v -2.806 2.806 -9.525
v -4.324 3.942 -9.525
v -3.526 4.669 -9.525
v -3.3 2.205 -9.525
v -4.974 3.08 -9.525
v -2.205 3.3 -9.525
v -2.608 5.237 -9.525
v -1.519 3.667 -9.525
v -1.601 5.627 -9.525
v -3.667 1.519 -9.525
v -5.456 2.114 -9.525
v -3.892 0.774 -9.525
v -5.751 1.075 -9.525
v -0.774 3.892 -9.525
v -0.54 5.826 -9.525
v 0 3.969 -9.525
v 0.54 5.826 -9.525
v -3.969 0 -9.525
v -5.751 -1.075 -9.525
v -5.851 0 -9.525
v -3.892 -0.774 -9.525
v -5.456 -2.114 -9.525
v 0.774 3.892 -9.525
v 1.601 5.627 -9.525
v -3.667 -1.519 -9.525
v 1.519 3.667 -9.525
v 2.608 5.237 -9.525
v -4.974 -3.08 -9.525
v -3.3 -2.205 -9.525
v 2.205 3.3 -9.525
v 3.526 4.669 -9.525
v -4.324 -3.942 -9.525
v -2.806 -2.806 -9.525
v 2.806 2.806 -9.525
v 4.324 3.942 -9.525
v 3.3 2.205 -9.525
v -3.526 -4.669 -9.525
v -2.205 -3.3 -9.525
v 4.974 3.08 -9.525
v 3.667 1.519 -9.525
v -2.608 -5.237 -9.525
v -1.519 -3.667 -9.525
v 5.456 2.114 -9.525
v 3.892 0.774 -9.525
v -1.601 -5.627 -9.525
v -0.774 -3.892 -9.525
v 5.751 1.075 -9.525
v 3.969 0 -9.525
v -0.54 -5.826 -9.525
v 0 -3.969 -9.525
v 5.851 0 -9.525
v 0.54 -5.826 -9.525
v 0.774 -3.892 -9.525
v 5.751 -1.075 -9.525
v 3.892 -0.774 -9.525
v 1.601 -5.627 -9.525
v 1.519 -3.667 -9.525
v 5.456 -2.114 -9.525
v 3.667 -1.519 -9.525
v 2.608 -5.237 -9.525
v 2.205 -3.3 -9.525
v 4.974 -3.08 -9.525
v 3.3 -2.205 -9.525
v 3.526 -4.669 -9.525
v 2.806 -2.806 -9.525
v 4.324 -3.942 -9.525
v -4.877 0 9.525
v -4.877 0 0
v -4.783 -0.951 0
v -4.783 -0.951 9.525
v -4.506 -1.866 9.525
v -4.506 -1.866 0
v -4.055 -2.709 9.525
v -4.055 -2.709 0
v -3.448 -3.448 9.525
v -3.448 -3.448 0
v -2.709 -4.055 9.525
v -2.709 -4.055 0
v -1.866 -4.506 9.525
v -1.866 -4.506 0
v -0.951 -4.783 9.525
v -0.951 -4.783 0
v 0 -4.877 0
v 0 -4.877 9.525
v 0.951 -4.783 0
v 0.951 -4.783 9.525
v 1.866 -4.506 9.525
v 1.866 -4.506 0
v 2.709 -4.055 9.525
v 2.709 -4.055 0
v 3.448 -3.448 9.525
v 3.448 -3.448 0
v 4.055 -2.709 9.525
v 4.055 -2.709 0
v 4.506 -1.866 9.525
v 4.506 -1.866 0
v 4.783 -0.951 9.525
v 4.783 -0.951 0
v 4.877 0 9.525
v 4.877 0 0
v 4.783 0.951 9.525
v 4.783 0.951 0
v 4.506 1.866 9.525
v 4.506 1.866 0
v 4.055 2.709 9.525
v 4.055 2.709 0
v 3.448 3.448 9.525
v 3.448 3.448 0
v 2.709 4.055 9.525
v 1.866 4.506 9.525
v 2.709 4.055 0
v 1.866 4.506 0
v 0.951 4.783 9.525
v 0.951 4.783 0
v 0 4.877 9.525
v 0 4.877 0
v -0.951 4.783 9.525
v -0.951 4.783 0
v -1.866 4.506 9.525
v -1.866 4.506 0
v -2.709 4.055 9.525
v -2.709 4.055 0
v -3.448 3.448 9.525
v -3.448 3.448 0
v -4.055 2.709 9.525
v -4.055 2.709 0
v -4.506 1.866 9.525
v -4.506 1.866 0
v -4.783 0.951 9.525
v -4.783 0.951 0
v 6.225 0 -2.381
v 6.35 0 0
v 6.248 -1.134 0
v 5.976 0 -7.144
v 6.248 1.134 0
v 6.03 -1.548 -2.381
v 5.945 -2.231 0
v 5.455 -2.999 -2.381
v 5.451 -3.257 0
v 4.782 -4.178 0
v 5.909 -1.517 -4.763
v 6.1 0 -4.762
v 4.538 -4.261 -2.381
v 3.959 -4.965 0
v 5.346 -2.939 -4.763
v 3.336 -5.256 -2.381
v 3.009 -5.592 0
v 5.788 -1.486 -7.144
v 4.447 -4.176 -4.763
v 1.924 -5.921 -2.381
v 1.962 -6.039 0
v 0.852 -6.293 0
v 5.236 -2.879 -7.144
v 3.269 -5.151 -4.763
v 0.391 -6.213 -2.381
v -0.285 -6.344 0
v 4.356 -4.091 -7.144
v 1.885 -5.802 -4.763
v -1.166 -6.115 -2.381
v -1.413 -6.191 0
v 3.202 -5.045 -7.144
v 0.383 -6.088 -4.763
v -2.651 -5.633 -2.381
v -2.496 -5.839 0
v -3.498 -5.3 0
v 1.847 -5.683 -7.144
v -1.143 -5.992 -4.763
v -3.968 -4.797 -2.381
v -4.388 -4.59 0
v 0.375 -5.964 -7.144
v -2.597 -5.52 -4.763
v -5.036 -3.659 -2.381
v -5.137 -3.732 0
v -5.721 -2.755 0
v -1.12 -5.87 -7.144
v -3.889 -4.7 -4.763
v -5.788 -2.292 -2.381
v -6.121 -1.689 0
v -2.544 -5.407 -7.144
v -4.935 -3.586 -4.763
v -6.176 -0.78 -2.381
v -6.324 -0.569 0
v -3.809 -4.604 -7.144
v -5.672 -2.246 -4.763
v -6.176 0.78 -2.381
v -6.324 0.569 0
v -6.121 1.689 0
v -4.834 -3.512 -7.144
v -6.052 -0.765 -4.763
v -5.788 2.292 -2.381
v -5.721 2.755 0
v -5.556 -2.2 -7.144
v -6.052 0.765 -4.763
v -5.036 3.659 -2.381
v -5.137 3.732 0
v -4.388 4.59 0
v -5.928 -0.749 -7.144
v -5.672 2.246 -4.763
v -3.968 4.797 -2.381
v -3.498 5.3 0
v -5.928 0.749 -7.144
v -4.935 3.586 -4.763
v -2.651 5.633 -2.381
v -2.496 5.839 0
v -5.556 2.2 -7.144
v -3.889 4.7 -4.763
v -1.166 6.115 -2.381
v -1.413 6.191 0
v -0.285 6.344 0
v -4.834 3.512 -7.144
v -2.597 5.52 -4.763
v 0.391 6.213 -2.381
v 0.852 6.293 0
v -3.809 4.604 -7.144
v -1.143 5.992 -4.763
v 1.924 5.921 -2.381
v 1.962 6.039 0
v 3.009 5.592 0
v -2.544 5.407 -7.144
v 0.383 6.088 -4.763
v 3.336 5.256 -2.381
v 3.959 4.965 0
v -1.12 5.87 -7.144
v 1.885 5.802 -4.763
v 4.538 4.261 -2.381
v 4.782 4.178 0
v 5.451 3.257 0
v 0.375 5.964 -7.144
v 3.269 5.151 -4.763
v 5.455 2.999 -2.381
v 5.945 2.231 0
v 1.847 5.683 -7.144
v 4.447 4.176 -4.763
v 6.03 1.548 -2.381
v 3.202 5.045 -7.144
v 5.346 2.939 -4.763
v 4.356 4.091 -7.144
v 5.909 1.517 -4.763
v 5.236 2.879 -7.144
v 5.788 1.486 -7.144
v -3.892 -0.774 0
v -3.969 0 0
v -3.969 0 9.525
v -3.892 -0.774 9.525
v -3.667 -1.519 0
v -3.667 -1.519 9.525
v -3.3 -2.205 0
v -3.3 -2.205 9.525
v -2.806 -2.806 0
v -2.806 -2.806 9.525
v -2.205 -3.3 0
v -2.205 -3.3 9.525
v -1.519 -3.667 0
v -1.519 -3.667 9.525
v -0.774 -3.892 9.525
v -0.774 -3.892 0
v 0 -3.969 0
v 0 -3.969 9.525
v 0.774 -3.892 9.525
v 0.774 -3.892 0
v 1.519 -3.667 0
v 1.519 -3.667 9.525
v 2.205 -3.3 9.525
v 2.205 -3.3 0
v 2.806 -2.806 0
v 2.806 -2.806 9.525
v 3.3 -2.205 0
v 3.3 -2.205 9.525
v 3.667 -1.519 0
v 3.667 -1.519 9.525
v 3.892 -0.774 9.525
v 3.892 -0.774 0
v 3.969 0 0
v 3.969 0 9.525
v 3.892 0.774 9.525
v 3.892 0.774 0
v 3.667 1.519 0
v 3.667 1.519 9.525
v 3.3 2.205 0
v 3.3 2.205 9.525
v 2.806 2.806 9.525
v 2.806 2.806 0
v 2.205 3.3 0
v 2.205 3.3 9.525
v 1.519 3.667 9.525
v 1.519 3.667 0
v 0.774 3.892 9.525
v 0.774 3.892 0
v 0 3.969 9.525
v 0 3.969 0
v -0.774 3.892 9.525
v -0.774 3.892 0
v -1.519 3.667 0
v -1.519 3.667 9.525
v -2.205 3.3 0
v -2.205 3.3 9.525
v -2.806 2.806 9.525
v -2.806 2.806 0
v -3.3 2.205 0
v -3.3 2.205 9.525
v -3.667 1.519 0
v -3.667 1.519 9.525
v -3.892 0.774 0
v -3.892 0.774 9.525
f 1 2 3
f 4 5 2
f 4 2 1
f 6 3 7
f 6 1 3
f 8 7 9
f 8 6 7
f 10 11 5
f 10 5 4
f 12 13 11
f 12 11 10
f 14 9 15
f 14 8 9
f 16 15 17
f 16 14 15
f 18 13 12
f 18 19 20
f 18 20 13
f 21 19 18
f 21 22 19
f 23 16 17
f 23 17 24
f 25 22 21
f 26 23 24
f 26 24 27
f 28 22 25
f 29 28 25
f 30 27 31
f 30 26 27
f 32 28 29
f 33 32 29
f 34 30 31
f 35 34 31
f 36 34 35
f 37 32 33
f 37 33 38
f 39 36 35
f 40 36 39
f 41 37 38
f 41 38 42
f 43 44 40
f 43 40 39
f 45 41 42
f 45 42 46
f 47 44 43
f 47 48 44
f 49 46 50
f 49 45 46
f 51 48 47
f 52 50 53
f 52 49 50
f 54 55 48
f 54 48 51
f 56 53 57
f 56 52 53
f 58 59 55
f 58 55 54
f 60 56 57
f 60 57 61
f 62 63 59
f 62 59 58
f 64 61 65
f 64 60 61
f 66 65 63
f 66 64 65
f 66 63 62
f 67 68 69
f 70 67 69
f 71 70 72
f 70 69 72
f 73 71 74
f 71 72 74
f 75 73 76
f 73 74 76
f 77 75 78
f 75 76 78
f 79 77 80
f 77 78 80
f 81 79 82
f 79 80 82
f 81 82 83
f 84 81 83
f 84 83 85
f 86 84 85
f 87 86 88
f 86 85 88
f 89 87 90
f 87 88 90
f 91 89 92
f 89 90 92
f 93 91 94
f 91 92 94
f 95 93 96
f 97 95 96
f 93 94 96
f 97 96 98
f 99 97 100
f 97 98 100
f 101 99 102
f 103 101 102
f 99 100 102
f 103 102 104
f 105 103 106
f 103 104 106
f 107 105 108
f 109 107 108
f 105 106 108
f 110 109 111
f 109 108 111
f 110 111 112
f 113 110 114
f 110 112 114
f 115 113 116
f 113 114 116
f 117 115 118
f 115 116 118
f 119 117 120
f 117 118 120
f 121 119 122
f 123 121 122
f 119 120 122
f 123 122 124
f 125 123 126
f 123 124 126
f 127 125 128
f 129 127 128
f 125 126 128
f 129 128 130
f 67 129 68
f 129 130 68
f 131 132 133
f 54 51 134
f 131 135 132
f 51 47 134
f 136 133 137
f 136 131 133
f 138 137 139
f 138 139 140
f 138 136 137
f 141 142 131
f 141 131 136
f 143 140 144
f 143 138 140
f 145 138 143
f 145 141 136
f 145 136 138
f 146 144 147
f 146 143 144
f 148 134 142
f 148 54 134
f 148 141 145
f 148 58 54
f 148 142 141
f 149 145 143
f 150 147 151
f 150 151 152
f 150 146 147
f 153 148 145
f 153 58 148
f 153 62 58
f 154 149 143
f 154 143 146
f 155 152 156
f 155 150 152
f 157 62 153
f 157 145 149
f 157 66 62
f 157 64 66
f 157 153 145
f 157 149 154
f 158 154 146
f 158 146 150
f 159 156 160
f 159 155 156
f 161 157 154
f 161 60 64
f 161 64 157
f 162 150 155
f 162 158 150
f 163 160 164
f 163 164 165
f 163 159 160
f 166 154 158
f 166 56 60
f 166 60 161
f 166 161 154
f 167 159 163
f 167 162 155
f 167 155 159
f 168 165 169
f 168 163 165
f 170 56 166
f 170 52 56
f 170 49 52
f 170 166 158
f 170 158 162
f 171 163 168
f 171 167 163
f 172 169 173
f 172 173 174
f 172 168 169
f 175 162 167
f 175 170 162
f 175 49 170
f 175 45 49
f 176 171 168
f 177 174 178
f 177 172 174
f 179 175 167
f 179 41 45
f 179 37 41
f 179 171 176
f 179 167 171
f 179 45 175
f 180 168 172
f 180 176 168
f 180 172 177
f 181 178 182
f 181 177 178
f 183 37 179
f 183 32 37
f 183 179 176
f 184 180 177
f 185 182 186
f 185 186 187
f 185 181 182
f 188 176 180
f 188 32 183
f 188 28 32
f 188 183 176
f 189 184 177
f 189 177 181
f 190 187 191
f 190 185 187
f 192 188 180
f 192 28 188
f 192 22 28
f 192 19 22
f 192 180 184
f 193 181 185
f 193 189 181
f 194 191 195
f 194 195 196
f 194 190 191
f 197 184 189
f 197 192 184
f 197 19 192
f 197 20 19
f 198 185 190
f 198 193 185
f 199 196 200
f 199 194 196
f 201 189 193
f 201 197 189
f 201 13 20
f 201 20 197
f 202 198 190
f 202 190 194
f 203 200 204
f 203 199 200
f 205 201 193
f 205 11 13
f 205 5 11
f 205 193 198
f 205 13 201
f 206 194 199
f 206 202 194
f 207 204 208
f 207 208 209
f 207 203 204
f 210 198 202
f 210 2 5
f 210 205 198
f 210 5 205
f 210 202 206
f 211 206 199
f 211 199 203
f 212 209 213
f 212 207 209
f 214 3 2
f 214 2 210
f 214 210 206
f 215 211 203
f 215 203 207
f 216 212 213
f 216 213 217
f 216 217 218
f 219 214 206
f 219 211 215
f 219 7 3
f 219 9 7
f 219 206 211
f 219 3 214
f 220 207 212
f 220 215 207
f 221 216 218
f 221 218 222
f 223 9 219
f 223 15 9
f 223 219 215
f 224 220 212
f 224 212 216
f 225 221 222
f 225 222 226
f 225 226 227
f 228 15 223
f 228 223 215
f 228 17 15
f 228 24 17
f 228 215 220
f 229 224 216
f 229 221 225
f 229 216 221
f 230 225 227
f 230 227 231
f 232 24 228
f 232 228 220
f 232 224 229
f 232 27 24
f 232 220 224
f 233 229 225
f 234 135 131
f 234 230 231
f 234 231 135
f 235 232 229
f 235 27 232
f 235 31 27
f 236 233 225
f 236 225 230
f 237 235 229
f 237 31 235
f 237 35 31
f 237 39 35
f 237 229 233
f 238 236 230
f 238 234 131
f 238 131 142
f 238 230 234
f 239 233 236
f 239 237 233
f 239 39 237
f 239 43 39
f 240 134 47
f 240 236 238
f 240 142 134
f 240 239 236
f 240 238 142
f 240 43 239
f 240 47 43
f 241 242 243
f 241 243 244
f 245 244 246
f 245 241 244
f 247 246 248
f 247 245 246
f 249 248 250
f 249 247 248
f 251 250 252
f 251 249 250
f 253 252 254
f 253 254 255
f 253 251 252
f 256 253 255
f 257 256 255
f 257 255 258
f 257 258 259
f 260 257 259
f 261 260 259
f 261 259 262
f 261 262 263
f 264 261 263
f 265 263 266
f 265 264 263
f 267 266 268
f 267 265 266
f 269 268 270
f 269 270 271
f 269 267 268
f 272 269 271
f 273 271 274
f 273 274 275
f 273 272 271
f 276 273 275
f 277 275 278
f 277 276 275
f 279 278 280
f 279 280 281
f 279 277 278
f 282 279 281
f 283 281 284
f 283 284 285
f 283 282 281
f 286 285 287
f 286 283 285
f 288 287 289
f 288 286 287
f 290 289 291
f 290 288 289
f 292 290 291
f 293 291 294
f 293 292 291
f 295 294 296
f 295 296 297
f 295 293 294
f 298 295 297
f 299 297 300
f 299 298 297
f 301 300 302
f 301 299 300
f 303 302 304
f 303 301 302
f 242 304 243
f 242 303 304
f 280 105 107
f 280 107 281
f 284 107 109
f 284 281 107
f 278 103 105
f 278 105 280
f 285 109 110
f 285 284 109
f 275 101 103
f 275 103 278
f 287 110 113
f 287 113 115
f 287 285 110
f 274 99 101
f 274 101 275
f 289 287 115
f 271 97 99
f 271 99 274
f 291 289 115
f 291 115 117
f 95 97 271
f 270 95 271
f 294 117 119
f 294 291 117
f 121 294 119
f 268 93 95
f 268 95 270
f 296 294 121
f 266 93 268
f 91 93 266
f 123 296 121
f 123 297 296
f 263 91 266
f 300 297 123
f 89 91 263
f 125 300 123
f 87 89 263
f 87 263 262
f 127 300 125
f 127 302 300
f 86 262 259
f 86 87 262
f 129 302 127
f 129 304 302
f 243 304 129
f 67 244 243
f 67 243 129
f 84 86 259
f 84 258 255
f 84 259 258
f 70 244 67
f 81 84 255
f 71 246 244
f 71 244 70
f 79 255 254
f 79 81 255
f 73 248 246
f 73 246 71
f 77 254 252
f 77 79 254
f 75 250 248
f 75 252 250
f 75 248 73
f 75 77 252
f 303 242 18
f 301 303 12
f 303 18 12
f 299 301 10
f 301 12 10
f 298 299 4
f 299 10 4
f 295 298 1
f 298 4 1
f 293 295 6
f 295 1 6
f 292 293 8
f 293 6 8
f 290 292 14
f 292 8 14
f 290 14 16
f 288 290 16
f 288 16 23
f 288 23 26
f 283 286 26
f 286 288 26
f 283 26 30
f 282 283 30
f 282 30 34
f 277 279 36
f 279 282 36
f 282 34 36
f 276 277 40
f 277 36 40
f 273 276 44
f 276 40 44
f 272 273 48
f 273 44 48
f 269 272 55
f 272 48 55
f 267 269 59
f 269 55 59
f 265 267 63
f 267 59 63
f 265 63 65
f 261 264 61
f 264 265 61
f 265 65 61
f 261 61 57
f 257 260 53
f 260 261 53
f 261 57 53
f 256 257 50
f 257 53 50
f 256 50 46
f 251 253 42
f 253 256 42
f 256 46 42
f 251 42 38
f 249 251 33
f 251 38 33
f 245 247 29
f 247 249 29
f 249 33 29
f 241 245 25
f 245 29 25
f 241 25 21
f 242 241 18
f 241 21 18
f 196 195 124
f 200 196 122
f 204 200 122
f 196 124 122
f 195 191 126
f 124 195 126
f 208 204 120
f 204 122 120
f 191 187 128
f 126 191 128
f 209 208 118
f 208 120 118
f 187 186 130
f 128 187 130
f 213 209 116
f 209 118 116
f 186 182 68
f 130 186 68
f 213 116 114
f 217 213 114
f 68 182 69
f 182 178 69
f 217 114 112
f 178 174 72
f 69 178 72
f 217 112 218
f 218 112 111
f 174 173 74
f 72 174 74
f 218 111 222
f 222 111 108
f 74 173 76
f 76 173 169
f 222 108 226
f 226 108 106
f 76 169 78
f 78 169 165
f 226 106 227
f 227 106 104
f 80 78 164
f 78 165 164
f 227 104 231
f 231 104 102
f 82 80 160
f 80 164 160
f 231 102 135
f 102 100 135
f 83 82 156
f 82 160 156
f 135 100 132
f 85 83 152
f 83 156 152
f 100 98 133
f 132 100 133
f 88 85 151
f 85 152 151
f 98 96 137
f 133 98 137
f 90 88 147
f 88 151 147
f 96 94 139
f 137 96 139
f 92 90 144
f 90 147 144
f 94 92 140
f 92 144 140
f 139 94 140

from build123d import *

# Parameters (mm, degrees)
SKETCH2_R           = 4.8768
SKETCH2_R_2         = 3.96875
BOSS_EXTRUDE1_DEPTH = 9.525
BOSS_EXTRUDE2_START = 9.525
SKETCH3_R           = 6.35
SKETCH3_R_2         = 3.96875
BOSS_EXTRUDE2_DEPTH = 9.525
DRAFT1_ANGLE        = -3


with BuildPart() as part:
    # Sketch2 → Boss-Extrude1 (new body)
    with BuildSketch(Plane.XY):
        with Locations(Location((0, 0, 0), (0, 0, 180))):
            Circle(SKETCH2_R)
        with Locations(Location((0, 0, 0), (0, 0, 180))):
            Circle(SKETCH2_R_2, mode=Mode.SUBTRACT)
    extrude(amount=BOSS_EXTRUDE1_DEPTH)

    # Sketch3 → Boss-Extrude2 (add)
    with BuildSketch(Plane(origin=(0, 0, 0), x_dir=(-1, 0, 0), z_dir=(0, 0, -1)).offset(BOSS_EXTRUDE2_START)):
        with Locations(Location((0, 0, 0), (0, 0, 180))):
            Circle(SKETCH3_R)
        Circle(SKETCH3_R_2, mode=Mode.SUBTRACT)
    extrude(amount=-BOSS_EXTRUDE2_DEPTH)

    # Draft1
    draft1_faces = [part.faces().sort_by_distance(p)[0] for p in [
        (-6.35, 0, -4.7625),
    ]]
    draft(draft1_faces, Plane.XY, DRAFT1_ANGLE)


solid = part.part
